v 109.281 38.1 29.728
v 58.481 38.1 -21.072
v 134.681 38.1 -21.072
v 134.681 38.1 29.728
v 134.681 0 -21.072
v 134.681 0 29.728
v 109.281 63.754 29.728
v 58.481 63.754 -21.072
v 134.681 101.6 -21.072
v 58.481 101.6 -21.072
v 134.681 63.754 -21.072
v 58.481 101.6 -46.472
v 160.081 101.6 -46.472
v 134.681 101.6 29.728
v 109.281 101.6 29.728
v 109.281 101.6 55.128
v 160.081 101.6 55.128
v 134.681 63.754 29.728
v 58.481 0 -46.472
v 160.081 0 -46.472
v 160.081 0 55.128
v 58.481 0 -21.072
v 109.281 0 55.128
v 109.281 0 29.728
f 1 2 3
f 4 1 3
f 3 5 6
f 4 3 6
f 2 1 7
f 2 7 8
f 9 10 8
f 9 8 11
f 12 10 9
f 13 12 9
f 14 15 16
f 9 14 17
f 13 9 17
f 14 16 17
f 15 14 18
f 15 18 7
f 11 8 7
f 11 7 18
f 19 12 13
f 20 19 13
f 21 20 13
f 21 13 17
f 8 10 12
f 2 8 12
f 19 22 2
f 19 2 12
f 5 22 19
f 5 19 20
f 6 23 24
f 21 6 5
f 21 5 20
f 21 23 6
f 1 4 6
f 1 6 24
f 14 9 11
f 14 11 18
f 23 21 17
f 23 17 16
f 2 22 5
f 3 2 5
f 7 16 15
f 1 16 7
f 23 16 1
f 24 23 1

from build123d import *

# Parameters (mm, degrees)
F1_DEPTH = 101.6
F3_DEPTH = 101.854
F5_DEPTH = 25.4
F6_DEPTH = 25.4
F7_DEPTH = 12.7
F8_DEPTH = 12.7


with BuildPart() as f1:
    # F0 (on Front) → F1 (new body)
    with BuildSketch(Plane.XZ):
        Polygon((160.0811270237, -46.4719723254), (160.0811270237, 55.1280276746), (109.2811270237, 55.1280276746), (109.2811270237, 29.7280276746), (134.6811270237, 29.7280276746), (134.6811270237, -21.0719723254), (58.4811270237, -21.0719723254), (58.4811270237, -46.4719723254), align=None)
    extrude(amount=-F1_DEPTH)

    # F2 (on face) → F3 (join)
    with BuildSketch(Plane.XZ):
        Polygon((109.2811270237, 29.7280276746), (58.4811270237, -21.0719723254), (134.6811270237, -21.0719723254), (134.6811270237, 29.7280276746), align=None)
    extrude(amount=-F3_DEPTH)

    # F4 (on face) → F5 (cut)
    with BuildSketch(Plane.XZ):
        Polygon((109.2811270237, 29.7280276746), (58.4811270237, -21.0719723254), (134.6811270237, -21.0719723254), (134.6811270237, 29.7280276746), align=None)
    extrude(amount=-F5_DEPTH, mode=Mode.SUBTRACT)

    # F6 (cut): a face of the model
    f6_faces = [f1.faces().sort_by_distance(p)[0] for p in [
        (107.164460357, 101.854, 0.0946943412),
    ]]
    extrude(f6_faces, amount=-F6_DEPTH, mode=Mode.SUBTRACT)

    # F7 (cut): a face of the model
    f7_faces = [f1.faces().sort_by_distance(p)[0] for p in [
        (107.164460357, 25.4, 0.0946943412),
    ]]
    extrude(f7_faces, amount=-F7_DEPTH, mode=Mode.SUBTRACT)

    # F8 (cut): a face of the model
    f8_faces = [f1.faces().sort_by_distance(p)[0] for p in [
        (107.164460357, 76.454, 0.0946943412),
    ]]
    extrude(f8_faces, amount=-F8_DEPTH, mode=Mode.SUBTRACT)


solid = f1.part
